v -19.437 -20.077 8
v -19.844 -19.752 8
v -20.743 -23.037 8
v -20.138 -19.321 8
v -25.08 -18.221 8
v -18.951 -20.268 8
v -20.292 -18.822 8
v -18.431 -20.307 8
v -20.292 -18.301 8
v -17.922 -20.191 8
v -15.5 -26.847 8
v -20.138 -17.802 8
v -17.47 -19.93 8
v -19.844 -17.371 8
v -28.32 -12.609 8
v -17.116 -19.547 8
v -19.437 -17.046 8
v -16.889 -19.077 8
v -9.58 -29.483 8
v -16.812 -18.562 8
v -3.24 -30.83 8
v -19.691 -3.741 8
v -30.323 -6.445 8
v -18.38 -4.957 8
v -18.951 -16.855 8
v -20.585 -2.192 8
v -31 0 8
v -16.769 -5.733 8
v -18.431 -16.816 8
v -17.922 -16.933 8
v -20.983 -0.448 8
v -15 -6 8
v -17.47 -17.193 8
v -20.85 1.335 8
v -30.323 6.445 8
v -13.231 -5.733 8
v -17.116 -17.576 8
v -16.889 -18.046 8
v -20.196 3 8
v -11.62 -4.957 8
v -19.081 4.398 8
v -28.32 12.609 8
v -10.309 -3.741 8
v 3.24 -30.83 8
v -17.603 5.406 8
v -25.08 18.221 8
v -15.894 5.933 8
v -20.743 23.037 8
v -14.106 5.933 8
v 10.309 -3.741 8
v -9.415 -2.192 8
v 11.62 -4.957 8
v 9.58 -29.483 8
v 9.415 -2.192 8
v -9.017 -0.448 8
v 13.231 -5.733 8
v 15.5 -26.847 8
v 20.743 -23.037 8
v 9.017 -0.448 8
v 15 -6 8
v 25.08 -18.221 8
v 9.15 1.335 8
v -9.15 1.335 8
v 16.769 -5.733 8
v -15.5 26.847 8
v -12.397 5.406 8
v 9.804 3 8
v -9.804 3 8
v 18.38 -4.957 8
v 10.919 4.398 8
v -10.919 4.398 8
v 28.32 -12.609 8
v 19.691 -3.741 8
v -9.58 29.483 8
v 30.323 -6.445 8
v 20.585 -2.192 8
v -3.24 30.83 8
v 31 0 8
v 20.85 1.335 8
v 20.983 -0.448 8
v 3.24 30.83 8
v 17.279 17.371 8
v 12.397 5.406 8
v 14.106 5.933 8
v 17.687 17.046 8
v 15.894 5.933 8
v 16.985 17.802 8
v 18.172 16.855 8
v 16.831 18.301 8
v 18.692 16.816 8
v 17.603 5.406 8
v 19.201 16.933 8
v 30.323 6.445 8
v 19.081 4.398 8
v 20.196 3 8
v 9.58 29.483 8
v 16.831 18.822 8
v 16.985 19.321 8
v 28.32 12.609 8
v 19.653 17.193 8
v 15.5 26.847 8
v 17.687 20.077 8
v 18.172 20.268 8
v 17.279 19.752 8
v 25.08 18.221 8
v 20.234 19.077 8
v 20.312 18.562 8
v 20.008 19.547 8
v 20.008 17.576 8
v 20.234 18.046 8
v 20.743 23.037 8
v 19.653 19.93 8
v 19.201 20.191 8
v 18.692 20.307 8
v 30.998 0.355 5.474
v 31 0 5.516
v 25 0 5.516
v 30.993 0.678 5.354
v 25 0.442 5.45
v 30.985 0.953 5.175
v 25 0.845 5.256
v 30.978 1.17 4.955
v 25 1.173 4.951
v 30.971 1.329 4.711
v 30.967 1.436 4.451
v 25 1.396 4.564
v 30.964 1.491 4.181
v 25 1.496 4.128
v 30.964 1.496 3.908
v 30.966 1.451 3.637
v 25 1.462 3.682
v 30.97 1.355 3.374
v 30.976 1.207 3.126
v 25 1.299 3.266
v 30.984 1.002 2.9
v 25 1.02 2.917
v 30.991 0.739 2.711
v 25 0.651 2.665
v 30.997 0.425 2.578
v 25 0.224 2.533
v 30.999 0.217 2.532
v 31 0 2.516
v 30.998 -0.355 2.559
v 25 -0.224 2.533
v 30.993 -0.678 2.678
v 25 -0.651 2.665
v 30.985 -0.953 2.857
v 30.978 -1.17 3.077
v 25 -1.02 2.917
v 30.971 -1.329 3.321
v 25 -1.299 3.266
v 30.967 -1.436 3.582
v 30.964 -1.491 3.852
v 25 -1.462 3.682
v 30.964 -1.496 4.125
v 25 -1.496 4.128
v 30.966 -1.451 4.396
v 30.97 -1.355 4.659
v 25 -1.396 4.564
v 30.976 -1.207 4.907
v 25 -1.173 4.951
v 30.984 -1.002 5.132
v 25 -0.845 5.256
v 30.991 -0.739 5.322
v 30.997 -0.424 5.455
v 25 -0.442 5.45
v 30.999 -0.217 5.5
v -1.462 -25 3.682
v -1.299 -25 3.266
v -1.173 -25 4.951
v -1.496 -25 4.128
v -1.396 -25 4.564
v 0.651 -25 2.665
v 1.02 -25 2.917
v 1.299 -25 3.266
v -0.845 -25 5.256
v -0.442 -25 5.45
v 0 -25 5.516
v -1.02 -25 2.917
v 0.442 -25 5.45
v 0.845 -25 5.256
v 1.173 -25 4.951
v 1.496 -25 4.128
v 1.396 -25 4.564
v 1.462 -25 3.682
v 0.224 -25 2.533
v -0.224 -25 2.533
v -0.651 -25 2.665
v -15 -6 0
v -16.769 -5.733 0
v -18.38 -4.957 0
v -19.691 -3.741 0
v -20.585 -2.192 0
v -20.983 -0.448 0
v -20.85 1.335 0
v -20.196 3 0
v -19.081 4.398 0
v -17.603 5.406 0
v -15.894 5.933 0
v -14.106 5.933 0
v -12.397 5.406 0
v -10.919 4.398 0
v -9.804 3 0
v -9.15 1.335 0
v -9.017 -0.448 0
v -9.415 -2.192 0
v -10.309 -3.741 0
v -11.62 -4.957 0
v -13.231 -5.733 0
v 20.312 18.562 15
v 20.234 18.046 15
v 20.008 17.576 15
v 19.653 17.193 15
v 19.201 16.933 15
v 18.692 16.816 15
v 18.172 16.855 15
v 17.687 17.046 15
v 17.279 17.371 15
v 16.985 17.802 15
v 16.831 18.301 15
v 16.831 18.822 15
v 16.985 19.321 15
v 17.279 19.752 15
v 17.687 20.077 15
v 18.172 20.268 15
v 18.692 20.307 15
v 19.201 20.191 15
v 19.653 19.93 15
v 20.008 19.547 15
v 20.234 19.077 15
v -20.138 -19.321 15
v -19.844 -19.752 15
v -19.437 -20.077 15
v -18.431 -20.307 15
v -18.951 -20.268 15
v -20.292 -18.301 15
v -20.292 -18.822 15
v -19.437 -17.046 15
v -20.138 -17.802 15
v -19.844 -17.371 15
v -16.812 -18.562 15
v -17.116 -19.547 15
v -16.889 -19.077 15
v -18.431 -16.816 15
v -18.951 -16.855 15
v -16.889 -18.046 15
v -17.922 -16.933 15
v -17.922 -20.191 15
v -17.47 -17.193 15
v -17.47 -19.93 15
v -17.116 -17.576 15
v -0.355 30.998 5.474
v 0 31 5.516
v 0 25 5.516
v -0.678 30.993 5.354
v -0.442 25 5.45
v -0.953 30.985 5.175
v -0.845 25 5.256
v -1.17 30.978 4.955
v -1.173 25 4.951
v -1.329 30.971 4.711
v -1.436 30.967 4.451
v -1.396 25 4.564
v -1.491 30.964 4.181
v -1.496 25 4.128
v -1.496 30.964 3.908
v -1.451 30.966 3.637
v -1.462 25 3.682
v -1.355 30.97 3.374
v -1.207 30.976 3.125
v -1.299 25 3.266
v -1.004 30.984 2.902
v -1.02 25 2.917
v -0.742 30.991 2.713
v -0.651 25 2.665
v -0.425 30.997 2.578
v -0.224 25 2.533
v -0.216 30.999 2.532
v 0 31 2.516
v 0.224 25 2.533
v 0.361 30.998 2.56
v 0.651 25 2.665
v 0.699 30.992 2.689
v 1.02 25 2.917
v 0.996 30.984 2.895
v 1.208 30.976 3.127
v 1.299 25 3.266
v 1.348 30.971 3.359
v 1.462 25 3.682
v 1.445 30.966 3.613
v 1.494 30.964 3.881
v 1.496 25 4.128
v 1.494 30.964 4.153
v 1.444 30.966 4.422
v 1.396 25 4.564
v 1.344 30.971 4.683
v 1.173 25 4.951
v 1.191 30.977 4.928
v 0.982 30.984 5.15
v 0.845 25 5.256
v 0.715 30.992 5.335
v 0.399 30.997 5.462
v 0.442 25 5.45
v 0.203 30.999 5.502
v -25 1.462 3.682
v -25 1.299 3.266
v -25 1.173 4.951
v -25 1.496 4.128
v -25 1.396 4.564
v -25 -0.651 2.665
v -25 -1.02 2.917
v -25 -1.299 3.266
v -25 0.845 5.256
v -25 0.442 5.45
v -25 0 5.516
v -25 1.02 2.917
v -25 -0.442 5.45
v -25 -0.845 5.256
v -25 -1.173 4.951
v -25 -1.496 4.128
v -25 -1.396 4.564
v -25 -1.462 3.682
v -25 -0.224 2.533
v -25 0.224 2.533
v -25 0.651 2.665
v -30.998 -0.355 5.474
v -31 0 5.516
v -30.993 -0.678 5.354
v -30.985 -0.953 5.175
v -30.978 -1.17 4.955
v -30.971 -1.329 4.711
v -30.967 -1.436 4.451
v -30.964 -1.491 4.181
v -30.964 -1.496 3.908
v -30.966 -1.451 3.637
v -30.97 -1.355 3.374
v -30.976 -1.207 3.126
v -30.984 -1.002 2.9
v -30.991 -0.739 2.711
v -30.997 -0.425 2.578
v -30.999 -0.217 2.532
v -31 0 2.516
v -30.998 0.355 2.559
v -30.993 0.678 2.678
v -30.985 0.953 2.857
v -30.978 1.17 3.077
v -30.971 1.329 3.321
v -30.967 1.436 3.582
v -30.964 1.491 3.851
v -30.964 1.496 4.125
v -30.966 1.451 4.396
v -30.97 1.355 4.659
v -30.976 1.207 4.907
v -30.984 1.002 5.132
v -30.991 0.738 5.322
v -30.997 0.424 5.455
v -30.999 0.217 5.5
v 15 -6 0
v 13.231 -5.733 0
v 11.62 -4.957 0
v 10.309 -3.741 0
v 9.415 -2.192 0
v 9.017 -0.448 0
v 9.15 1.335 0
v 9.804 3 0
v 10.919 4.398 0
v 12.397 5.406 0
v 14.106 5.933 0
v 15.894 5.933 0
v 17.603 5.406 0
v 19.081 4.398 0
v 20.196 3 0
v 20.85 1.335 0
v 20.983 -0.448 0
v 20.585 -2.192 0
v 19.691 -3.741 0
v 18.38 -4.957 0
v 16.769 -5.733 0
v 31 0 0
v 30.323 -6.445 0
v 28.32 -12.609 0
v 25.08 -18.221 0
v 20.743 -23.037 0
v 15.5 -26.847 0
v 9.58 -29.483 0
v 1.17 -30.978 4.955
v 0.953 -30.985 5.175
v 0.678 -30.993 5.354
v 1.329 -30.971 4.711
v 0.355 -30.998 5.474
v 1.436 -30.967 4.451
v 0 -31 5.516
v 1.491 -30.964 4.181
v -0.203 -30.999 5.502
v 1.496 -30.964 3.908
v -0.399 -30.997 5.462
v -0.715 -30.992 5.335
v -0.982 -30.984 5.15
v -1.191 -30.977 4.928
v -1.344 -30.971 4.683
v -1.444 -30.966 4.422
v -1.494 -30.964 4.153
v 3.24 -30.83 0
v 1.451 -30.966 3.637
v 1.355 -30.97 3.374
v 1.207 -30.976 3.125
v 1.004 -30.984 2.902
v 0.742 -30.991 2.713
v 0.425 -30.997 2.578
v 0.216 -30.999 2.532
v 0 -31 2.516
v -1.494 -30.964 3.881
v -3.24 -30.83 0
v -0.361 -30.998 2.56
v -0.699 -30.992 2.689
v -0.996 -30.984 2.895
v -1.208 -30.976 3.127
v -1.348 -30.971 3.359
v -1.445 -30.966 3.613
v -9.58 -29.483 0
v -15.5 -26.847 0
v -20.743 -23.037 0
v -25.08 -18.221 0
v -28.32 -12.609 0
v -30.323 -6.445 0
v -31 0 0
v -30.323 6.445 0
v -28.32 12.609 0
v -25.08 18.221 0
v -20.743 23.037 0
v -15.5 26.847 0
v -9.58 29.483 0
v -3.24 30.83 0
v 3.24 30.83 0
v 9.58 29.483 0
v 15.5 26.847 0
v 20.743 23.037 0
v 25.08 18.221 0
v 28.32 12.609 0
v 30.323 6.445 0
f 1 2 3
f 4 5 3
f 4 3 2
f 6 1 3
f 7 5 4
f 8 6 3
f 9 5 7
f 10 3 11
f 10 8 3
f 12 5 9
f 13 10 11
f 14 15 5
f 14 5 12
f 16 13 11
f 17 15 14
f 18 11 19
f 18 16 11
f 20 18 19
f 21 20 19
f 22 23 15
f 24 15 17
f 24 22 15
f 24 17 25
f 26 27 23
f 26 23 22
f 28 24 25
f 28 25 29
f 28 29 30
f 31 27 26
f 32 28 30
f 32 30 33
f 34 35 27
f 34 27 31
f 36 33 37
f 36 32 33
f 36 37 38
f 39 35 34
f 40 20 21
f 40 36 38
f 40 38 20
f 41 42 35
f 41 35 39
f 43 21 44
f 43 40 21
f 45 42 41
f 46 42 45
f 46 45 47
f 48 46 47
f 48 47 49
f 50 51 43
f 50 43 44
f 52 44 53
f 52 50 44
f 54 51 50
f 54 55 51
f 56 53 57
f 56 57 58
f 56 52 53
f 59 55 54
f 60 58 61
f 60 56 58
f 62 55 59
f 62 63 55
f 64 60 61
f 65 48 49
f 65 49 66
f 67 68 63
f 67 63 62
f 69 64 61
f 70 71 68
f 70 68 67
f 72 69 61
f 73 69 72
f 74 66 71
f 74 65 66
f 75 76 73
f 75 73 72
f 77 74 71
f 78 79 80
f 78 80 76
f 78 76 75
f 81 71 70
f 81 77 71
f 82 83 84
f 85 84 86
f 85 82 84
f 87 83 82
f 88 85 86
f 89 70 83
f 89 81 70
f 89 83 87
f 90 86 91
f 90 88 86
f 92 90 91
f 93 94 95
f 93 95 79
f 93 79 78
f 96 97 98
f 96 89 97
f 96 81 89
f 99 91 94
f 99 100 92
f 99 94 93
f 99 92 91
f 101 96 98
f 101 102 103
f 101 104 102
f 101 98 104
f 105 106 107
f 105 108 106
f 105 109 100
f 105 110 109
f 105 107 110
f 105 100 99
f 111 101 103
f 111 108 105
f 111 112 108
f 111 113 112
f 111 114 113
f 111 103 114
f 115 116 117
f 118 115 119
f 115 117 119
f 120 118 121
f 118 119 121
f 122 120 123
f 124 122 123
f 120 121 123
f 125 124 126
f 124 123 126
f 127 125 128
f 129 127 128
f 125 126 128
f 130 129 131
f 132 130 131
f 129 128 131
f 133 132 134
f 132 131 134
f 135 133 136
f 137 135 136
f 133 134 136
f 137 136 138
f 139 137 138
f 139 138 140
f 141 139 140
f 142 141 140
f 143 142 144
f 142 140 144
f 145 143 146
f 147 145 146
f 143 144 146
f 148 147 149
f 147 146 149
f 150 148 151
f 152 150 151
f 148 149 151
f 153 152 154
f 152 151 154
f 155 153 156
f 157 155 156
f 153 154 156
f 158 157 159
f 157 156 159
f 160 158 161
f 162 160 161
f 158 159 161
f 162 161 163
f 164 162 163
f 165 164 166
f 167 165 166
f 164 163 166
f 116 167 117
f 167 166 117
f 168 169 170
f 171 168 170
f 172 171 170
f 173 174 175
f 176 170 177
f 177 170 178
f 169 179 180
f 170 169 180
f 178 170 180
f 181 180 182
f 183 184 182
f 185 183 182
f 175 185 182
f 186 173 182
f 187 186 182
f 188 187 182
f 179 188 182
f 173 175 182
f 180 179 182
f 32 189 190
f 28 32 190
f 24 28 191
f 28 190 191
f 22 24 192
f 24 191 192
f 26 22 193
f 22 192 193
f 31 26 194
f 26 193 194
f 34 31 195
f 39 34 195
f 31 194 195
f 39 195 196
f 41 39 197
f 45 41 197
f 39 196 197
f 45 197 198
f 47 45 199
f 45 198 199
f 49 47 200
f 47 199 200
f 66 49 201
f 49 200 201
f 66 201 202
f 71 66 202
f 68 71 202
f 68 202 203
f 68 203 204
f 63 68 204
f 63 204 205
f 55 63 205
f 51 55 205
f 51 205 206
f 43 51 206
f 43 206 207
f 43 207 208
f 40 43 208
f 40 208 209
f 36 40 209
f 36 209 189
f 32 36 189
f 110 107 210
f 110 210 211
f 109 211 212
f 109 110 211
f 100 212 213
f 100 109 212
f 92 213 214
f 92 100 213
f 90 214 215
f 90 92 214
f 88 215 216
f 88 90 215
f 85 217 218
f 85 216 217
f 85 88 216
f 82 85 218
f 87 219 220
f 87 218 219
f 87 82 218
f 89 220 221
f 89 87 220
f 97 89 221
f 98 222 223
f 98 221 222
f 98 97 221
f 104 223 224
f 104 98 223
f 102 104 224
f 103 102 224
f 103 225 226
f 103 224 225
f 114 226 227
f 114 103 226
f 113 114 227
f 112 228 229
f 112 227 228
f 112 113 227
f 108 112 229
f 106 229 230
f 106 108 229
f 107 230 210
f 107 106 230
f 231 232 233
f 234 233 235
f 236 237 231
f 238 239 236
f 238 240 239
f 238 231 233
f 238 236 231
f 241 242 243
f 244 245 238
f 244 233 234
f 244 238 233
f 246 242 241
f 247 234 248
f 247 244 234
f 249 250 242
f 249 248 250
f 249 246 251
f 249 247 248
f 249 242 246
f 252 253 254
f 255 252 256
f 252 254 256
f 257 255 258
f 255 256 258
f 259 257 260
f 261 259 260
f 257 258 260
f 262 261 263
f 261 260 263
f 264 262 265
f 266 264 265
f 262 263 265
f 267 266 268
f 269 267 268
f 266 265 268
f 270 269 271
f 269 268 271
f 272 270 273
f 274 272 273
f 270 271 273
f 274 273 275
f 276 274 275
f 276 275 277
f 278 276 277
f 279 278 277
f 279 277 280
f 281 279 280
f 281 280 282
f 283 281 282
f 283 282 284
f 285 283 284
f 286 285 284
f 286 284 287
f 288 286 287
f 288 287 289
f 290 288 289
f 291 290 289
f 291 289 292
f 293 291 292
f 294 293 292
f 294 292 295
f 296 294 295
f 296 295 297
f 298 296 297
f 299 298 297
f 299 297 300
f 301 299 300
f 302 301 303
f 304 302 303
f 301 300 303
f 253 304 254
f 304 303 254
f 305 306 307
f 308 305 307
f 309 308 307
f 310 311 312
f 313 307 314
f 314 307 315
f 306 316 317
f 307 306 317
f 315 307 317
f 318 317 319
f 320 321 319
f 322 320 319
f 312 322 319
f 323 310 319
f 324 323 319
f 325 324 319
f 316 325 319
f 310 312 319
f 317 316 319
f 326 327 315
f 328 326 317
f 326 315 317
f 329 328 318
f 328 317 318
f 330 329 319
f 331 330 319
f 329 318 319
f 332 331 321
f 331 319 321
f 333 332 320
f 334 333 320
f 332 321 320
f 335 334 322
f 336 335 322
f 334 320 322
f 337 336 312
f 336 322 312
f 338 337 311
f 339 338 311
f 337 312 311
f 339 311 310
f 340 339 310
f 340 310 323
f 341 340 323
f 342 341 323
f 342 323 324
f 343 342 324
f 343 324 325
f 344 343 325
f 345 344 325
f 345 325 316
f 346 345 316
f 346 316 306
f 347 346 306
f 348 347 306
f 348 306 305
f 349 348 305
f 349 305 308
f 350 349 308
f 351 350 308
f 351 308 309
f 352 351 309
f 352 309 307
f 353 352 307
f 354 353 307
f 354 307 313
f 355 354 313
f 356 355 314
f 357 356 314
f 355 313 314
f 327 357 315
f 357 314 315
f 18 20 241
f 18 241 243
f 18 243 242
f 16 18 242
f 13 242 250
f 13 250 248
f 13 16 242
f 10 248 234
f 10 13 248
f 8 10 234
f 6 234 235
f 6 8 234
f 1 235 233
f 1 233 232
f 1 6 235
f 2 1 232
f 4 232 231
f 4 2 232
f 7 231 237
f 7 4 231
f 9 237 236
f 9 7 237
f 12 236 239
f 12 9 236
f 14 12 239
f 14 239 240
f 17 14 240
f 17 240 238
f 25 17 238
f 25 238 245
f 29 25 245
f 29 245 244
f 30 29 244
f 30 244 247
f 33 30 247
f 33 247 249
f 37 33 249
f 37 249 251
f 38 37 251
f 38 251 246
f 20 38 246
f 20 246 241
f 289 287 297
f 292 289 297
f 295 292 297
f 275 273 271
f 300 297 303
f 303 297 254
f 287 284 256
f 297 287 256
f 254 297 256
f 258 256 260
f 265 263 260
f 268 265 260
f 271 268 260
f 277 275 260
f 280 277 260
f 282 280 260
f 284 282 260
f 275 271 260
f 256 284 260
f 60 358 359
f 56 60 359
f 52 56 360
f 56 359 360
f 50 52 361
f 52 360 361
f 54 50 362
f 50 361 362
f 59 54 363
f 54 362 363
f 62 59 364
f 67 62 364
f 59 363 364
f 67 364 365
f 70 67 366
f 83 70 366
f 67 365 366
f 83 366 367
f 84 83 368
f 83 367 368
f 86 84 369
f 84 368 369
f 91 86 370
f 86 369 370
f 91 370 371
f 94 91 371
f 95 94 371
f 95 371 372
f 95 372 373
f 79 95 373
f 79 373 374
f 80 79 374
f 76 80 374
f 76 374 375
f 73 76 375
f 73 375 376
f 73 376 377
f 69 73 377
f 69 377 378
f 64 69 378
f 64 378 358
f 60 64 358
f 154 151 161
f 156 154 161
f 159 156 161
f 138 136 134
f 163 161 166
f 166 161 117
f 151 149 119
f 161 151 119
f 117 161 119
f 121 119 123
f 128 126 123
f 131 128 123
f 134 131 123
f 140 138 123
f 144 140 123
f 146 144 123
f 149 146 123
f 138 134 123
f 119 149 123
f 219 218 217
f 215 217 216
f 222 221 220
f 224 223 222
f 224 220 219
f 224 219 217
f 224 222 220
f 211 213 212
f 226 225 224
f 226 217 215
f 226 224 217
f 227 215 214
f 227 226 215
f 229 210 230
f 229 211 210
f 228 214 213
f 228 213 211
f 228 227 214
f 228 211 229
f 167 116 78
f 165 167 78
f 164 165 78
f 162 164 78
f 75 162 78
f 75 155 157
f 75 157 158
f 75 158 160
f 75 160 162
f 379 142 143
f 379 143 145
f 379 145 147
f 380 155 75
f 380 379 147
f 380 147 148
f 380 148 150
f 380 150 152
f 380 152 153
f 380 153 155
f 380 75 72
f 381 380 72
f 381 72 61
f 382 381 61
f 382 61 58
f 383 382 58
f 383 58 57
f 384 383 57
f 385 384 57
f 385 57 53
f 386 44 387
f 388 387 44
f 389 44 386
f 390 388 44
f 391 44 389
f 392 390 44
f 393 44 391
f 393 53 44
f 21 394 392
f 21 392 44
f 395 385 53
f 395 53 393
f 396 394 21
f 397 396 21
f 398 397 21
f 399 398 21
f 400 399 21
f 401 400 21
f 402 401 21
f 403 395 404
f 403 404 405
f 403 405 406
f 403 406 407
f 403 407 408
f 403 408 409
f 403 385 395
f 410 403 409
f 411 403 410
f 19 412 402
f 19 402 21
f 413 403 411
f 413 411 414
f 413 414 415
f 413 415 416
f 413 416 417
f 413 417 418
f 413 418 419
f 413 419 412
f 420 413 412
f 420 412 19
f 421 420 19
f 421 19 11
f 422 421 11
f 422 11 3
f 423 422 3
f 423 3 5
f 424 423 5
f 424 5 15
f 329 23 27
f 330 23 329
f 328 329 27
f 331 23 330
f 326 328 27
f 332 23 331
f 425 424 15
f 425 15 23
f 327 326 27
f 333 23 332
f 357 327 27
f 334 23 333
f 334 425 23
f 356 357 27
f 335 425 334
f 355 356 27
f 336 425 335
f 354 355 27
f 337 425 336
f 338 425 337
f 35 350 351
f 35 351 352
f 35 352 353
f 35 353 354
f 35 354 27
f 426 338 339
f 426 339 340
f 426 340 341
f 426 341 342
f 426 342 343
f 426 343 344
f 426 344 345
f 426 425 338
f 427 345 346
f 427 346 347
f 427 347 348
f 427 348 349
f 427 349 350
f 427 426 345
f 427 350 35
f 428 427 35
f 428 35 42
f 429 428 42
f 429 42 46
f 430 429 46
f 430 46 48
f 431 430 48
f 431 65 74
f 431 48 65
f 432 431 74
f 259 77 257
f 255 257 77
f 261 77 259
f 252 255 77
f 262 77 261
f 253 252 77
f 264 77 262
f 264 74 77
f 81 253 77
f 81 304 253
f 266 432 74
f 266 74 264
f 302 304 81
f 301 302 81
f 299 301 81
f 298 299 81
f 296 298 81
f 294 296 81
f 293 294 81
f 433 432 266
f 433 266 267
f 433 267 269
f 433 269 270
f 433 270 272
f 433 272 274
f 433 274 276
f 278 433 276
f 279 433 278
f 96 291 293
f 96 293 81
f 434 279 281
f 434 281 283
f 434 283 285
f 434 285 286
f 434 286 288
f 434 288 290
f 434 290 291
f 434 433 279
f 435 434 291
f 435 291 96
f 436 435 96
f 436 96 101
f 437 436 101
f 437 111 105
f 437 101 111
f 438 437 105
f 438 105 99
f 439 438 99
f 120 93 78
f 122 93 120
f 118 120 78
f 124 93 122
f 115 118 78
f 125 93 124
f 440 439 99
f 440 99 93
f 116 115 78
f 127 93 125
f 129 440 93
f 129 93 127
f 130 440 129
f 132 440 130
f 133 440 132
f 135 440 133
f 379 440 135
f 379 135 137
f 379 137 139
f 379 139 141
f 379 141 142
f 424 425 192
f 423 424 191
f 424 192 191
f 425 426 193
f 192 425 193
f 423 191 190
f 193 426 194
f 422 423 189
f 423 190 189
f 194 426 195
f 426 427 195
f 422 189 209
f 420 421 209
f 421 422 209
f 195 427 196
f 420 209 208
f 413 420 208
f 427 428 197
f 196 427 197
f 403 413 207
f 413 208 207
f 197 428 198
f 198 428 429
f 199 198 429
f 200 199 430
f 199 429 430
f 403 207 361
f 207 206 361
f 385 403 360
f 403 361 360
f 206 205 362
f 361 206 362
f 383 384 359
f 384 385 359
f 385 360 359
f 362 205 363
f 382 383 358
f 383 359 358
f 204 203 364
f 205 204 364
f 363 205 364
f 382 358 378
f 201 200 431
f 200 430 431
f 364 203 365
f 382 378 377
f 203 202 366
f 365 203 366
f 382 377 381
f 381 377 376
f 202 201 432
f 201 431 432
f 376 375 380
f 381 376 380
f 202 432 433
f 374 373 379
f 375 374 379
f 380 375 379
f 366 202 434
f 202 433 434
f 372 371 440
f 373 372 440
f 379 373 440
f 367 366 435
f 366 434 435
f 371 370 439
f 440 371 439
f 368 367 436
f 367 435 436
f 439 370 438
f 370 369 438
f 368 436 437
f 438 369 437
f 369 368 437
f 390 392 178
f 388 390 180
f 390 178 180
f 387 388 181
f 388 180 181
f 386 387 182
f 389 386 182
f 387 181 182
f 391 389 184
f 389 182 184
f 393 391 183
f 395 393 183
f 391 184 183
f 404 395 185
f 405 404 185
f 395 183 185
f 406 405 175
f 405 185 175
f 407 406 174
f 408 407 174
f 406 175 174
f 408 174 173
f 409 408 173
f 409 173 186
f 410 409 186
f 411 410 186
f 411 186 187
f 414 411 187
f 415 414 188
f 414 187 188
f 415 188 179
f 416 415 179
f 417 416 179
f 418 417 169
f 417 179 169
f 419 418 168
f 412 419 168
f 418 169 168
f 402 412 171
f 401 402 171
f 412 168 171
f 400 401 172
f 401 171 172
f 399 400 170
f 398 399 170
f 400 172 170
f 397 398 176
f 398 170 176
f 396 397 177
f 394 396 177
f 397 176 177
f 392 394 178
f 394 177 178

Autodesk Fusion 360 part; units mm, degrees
sketch "Sketch1" plane through (0, 0, 0) normal (0, 0, 1) x (1, 0, 0)
  circle A0 centre (0, 0) radius 31
  circle A1 centre (-18.5616, -18.5616) radius 1.75
  circle A2 centre (18.5616, 18.5616) radius 1.75
  circle A3 centre (-15, 0) radius 5
  line L0 (-18.5616, -18.5616) -> (-18.5616, -16.8116)
  circle A4 centre (15, 0) radius 5
  line L1 (0, 0) -> (0, 31)
  line L2 (0, 0) -> (31, 0)
  dimension "d1" = 62
  dimension "d6" = 3.5
  dimension "d10" = 15
  dimension "d11" = 10
extrude "Extrude1" add sketch "Sketch1" along normal blind 8 contours A0 A4 L1 L2 | A0 A4 L1 L2
ref_plane "WorkPlane1" through (0, 31, 0) normal (0, 1, 0) x (0, 0, 1)
sketch "Sketch2" plane through (0, 31, 0) normal (0, 1, 0) x (1, 0, 0)
  line L0 (0, 0) -> (0, -2.4162)
  circle A0 centre (0, -4.0162) radius 1.5
  dimension "d27" = 3
hole "Hole2" at (-15, 0, 8) direction (0, 0, -1) diameter 12 depth 18 tip angle 180
hole "Hole3" at (15, 0, 8) direction (0, 0, -1) diameter 12 depth 18 tip angle 180
hole "Hole4" at (0, 31, 4.0162) direction (0, -1, 0) diameter 3 depth 6 tip angle 180
pattern_circular "C-Pattern2" count 4 over 360 about axis through (0, 0, 1.75) along (0, 0, 1) of "Hole4"
extrude "Extrude2" add sketch "Sketch1" along normal blind 15 contours A1 | A2
